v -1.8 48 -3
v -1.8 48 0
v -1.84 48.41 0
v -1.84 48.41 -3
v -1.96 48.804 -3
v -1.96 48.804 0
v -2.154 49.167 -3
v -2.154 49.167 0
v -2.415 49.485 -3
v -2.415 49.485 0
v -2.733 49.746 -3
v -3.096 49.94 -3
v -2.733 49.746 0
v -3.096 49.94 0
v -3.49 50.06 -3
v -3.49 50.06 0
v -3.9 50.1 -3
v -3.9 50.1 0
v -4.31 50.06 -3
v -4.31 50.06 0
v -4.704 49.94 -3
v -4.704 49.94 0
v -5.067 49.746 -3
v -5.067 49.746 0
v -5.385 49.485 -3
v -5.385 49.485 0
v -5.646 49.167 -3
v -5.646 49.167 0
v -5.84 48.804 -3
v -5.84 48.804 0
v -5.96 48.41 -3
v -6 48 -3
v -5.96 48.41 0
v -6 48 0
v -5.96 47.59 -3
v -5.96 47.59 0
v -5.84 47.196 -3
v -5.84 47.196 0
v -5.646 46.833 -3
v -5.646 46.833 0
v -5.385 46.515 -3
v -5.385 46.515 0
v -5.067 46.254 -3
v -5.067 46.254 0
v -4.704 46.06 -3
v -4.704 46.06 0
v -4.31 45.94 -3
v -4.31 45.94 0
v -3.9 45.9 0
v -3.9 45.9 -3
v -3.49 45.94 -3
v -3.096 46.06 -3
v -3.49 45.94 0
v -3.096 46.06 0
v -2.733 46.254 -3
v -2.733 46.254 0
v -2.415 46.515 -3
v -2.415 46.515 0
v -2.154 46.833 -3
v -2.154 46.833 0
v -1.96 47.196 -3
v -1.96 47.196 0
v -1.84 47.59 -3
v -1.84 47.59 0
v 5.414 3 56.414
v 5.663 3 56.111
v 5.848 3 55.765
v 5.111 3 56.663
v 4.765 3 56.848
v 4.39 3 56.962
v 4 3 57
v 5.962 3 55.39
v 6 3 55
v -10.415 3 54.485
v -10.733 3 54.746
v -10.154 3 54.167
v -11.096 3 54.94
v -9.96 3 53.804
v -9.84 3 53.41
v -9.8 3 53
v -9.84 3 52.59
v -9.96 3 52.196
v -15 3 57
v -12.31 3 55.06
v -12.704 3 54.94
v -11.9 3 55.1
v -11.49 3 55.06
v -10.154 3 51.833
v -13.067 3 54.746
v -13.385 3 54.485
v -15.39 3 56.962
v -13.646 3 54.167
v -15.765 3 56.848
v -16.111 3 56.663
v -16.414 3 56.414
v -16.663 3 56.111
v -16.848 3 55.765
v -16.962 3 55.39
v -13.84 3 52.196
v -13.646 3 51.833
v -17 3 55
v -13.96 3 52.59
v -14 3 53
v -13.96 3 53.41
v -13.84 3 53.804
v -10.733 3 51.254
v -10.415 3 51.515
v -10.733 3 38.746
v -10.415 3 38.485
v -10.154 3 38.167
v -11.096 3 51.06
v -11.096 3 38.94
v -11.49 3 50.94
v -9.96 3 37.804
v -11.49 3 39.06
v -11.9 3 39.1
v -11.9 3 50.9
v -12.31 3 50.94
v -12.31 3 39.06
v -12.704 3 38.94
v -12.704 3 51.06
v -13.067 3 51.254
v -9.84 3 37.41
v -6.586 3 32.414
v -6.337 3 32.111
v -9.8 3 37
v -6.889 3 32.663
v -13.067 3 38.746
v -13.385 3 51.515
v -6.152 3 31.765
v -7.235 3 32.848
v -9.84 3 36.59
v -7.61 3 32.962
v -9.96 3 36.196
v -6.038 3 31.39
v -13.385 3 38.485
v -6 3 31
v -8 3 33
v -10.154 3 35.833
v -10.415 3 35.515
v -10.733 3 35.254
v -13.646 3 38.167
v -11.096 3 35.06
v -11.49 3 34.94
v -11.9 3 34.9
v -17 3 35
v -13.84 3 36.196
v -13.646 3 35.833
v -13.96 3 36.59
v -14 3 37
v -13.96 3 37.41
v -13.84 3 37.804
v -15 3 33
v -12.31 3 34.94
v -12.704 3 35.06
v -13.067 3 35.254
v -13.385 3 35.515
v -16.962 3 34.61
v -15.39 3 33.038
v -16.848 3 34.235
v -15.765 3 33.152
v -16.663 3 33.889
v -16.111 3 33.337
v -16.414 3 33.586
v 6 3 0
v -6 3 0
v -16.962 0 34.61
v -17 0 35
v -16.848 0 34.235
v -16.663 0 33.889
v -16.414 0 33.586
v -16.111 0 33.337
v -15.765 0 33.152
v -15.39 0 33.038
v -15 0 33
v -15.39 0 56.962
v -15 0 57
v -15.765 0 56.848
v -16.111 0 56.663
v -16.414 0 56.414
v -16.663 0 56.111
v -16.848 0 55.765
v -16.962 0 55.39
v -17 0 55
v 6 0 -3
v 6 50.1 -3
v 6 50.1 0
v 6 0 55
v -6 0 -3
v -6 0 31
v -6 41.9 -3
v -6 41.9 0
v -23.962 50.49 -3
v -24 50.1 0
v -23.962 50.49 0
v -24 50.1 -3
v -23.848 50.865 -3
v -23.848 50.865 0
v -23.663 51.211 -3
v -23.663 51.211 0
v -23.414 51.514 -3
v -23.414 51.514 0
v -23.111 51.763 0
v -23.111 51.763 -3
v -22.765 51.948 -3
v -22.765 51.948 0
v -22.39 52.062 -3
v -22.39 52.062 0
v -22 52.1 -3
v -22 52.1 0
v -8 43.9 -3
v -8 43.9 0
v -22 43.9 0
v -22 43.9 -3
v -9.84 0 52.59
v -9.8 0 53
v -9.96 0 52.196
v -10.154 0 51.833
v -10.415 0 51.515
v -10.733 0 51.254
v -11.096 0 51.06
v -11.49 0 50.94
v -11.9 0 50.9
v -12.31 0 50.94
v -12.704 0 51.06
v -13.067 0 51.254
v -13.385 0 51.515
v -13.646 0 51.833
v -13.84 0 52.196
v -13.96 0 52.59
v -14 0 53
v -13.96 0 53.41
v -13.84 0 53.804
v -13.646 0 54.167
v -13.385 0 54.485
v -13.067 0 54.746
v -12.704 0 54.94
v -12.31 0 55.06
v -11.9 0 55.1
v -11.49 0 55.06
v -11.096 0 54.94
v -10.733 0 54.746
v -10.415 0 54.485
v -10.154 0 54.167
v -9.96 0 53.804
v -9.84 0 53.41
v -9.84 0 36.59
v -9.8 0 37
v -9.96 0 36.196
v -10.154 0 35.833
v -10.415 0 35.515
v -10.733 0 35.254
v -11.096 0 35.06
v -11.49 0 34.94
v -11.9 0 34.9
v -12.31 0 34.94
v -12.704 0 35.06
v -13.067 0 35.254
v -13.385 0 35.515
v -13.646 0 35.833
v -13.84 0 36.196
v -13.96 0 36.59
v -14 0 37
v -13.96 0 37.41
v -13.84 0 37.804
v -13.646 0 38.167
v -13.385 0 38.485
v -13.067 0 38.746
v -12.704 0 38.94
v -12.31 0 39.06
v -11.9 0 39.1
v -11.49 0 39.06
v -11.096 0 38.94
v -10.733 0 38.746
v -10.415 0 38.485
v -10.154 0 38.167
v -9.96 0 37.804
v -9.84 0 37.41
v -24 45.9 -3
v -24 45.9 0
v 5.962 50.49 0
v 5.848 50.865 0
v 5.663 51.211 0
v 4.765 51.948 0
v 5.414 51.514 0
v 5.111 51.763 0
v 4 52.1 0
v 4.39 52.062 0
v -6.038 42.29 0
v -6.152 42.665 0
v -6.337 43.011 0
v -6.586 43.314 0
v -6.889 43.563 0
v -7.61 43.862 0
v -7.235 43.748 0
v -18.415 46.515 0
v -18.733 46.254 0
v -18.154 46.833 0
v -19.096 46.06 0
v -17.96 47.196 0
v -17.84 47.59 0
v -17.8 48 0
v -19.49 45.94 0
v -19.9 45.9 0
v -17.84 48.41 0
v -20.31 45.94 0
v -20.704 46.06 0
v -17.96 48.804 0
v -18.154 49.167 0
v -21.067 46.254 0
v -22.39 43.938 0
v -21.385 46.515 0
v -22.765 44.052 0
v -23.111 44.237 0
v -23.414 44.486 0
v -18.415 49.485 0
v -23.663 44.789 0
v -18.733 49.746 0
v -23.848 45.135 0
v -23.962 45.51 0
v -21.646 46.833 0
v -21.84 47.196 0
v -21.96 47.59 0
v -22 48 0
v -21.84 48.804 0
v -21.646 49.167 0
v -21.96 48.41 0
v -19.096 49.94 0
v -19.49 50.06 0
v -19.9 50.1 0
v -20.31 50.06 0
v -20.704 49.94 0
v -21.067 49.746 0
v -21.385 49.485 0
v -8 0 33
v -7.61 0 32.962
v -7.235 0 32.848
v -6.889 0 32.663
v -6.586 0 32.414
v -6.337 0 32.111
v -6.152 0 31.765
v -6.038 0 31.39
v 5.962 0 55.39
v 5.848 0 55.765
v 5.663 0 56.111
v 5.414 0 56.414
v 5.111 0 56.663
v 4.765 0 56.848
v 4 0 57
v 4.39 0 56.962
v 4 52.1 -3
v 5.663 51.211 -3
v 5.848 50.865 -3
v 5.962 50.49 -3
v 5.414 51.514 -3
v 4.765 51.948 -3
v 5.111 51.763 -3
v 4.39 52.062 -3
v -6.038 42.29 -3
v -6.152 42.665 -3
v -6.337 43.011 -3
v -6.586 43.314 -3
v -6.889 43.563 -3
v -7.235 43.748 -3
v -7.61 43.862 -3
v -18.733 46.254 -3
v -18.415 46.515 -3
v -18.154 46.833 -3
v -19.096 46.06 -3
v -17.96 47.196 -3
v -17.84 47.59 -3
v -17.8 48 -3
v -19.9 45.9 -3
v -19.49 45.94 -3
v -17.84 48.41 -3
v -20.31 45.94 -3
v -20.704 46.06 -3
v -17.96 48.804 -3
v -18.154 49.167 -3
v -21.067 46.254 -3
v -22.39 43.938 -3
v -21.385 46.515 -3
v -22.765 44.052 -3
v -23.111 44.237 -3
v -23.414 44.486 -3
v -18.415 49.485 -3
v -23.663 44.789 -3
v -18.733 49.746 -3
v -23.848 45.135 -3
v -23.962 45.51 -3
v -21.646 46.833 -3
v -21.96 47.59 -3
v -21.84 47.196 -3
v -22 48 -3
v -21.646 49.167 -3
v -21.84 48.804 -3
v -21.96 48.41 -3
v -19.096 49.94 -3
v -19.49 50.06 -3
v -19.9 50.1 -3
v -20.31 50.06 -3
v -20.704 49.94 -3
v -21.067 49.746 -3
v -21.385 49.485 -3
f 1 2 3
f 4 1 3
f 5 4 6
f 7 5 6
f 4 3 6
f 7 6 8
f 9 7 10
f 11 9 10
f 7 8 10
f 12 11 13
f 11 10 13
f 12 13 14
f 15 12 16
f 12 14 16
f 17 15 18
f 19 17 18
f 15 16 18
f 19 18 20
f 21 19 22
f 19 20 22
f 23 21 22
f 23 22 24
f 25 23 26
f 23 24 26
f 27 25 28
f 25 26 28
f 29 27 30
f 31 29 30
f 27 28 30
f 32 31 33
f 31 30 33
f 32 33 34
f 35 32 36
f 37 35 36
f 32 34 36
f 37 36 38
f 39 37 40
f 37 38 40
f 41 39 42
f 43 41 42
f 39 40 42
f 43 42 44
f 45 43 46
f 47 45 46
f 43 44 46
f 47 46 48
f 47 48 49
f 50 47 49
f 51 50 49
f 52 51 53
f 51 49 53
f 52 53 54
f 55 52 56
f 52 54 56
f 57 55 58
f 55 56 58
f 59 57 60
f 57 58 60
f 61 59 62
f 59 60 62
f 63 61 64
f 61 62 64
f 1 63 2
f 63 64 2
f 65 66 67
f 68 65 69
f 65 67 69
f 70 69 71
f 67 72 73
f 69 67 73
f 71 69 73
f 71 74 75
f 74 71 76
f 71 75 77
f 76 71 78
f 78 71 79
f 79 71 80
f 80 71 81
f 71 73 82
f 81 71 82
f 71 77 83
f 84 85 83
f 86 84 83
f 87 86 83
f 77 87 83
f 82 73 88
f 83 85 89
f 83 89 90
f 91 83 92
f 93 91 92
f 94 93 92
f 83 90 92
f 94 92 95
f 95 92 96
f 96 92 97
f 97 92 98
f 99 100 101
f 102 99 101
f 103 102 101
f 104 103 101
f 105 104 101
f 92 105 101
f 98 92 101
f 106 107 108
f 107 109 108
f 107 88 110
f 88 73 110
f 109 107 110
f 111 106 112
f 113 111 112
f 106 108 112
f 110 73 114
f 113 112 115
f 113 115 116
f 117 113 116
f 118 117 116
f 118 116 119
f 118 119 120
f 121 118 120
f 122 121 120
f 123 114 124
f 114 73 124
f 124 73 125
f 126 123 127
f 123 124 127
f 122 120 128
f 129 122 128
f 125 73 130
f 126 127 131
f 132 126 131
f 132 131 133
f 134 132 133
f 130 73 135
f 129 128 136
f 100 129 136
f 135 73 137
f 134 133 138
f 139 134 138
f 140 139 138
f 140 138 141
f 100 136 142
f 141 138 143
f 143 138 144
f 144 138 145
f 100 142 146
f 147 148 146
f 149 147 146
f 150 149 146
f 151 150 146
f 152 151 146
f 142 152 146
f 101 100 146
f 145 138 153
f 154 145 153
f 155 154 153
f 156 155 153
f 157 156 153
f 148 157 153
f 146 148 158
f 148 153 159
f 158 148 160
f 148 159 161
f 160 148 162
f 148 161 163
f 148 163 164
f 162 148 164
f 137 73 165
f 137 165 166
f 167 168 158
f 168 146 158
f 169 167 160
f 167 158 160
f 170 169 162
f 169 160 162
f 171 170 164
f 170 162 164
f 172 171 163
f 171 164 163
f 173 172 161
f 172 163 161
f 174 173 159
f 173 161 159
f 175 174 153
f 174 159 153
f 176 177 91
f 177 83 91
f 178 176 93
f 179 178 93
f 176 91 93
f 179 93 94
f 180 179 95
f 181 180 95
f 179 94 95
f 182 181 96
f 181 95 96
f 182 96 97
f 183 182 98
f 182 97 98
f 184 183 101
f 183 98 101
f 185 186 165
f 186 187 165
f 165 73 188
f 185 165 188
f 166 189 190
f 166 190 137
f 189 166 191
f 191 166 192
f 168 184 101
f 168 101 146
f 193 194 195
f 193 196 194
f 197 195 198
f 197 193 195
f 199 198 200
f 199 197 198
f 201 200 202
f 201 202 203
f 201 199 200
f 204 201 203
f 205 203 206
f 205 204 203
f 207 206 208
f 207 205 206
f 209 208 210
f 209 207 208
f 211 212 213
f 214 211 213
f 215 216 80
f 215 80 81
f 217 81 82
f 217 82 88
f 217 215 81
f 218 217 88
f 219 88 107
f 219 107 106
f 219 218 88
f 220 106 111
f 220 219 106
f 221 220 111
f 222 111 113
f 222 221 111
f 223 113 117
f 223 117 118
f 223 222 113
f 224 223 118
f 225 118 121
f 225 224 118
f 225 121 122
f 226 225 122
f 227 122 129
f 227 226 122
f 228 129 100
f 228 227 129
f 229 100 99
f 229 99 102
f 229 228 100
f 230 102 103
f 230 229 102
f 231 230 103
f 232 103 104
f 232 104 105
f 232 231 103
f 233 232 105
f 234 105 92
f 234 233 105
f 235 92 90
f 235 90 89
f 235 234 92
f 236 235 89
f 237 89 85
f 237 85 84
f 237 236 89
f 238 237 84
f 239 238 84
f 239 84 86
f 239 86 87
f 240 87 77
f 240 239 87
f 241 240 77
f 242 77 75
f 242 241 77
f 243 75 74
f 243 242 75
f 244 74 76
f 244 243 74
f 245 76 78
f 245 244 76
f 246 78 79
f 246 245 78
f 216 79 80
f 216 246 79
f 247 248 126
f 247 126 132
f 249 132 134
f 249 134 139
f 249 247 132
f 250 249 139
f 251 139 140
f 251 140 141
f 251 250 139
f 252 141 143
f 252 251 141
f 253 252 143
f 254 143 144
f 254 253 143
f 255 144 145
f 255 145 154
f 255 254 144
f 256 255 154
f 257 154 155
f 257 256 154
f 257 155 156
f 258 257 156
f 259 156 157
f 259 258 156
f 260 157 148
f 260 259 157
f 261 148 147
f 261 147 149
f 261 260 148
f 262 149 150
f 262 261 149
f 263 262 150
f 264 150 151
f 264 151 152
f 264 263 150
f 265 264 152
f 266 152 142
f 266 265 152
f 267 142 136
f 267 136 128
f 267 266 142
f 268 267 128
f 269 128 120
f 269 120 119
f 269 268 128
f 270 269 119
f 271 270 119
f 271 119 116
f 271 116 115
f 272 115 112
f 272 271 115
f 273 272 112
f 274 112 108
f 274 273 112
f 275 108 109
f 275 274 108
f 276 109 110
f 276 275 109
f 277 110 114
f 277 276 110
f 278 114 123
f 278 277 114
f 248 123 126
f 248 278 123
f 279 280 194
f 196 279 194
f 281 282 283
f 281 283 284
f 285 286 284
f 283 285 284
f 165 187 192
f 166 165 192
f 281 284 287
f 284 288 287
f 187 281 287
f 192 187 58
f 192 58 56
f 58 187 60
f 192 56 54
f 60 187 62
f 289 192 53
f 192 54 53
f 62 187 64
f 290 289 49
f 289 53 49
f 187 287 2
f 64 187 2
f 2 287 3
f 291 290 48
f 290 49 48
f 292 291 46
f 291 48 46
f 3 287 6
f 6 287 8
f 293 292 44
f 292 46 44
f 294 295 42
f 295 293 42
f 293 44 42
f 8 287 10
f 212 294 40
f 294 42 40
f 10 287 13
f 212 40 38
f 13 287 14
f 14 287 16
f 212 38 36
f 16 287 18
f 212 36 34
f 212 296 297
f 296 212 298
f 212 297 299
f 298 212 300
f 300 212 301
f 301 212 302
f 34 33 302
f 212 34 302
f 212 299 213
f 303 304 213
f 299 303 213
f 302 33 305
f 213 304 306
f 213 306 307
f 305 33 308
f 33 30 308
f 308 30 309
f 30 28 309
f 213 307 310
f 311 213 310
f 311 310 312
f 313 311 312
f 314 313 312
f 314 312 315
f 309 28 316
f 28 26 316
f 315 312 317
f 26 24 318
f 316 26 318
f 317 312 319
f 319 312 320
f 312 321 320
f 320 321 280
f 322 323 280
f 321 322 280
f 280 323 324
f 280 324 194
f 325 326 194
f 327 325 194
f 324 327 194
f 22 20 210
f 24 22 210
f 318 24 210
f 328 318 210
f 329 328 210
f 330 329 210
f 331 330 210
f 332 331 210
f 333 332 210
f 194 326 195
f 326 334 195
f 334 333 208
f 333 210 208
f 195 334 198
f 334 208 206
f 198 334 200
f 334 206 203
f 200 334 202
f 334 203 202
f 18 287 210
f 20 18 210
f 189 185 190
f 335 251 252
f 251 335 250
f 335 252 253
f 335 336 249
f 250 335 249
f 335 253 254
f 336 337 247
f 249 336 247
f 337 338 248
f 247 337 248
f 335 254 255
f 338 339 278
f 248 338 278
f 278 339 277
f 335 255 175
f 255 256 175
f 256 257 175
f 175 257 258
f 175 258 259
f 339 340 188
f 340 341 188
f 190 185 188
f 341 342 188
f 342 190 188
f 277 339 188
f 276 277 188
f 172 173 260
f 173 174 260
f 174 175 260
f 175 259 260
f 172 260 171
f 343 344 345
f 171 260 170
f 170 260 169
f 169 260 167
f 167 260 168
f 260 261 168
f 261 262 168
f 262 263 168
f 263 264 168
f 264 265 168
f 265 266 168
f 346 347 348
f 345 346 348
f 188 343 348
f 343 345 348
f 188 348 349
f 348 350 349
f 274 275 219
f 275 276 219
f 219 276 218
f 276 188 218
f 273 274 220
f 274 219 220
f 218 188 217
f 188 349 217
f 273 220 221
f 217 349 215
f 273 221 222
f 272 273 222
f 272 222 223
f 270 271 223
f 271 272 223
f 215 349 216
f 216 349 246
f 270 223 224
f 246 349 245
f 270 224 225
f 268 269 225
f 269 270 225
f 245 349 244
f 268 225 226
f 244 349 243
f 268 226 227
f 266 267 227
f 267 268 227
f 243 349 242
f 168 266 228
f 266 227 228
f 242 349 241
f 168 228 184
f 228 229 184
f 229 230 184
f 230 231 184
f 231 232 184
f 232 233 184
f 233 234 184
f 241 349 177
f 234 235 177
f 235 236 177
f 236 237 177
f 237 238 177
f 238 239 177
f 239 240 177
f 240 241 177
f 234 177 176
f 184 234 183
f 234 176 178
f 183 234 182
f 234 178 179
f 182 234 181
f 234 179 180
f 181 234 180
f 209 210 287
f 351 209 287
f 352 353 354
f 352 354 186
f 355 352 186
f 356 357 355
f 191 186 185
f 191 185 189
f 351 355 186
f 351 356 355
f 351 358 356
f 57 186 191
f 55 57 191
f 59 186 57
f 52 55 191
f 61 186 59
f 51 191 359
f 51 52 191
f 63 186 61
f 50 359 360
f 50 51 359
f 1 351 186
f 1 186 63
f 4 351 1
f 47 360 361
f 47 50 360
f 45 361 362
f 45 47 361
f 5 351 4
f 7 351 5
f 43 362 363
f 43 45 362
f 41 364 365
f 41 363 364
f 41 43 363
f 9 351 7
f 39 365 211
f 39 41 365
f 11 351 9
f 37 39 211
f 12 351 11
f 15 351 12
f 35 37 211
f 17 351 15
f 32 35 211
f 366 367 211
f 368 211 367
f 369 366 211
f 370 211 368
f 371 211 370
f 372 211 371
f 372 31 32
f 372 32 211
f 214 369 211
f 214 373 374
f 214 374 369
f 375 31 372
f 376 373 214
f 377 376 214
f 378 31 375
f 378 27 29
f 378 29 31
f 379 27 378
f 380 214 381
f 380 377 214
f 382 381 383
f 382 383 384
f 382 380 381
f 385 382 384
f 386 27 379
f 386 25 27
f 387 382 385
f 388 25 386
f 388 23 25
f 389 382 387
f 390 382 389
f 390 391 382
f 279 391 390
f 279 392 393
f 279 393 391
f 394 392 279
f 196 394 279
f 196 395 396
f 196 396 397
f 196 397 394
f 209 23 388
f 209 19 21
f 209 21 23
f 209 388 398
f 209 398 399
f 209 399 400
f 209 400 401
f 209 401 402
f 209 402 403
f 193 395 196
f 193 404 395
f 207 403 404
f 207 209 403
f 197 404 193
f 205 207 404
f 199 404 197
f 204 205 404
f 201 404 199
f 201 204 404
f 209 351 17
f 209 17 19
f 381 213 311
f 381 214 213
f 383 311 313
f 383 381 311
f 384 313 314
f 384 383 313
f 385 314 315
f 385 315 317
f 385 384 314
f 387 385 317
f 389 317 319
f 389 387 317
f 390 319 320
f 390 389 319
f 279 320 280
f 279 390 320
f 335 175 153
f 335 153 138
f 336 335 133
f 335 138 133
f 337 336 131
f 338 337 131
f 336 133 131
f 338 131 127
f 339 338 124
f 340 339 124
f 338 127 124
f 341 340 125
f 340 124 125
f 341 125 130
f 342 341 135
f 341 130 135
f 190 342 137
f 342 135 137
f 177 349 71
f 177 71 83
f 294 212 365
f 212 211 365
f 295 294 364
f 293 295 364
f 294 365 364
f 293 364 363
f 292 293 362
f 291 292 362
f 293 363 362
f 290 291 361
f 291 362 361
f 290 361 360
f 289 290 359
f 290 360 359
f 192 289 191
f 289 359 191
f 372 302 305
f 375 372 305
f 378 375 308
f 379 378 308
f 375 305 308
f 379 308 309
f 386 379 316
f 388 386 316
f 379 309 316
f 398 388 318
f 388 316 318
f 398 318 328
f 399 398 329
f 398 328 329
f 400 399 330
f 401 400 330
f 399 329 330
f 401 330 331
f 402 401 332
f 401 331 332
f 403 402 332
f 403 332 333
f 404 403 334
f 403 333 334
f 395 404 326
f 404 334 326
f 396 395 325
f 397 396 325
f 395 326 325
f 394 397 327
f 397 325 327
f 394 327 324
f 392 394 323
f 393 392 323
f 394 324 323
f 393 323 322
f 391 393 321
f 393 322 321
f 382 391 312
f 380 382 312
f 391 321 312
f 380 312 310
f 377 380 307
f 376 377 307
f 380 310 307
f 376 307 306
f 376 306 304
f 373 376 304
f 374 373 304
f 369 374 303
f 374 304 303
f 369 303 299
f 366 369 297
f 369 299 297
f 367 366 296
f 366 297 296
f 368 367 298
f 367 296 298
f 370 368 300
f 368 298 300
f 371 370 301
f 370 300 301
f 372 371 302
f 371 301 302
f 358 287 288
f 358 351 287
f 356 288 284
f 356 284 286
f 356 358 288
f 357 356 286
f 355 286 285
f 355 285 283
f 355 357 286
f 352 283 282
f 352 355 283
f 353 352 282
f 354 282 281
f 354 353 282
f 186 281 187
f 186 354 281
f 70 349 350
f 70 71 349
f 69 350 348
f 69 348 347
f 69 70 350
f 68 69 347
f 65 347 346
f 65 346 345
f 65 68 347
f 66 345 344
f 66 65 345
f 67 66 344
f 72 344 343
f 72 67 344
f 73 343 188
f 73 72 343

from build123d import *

# Parameters (mm, degrees)
SKETCH1_R           = 2.1
BOSS_EXTRUDE1_DEPTH = 3
SKETCH2_R           = 2.1
BOSS_EXTRUDE2_DEPTH = 3
FILLET1_R           = 2


with BuildPart() as part:
    # Sketch1 → Boss-Extrude1 (new body)
    with BuildSketch(Plane(origin=(0, 0, 0), x_dir=(1, 0, 0), z_dir=(0, 1, 0))):
        Polygon((-6, 0), (6, 0), (6, -57), (-17, -57), (-17, -33), (-6, -33), align=None)
        with Locations((-11.9, -37)):
            Circle(SKETCH1_R, mode=Mode.SUBTRACT)
        with Locations((-11.9, -53)):
            Circle(SKETCH1_R, mode=Mode.SUBTRACT)
    extrude(amount=BOSS_EXTRUDE1_DEPTH)

    # Sketch2 → Boss-Extrude2 (add)
    with BuildSketch(Plane.XY):
        Polygon((6, 0), (-6, 0), (-6, 43.9), (-24, 43.9), (-24, 52.1), (6, 52.1), align=None)
        with Locations((-19.9, 48)):
            Circle(SKETCH2_R, mode=Mode.SUBTRACT)
        with Locations((-3.9, 48)):
            Circle(SKETCH2_R, mode=Mode.SUBTRACT)
    extrude(amount=-BOSS_EXTRUDE2_DEPTH)

    # Fillet1
    fillet1_edges = [part.edges().sort_by_distance(p)[0] for p in [
        (6, 1.5, 57),
        (-17, 1.5, 57),
        (-17, 1.5, 33),
        (-6, 1.5, 33),
        (6, 52.1, -1.5),
        (-6, 43.9, -1.5),
        (-24, 43.9, -1.5),
        (-24, 52.1, -1.5),
    ]]
    fillet(fillet1_edges, radius=FILLET1_R)


solid = part.part
